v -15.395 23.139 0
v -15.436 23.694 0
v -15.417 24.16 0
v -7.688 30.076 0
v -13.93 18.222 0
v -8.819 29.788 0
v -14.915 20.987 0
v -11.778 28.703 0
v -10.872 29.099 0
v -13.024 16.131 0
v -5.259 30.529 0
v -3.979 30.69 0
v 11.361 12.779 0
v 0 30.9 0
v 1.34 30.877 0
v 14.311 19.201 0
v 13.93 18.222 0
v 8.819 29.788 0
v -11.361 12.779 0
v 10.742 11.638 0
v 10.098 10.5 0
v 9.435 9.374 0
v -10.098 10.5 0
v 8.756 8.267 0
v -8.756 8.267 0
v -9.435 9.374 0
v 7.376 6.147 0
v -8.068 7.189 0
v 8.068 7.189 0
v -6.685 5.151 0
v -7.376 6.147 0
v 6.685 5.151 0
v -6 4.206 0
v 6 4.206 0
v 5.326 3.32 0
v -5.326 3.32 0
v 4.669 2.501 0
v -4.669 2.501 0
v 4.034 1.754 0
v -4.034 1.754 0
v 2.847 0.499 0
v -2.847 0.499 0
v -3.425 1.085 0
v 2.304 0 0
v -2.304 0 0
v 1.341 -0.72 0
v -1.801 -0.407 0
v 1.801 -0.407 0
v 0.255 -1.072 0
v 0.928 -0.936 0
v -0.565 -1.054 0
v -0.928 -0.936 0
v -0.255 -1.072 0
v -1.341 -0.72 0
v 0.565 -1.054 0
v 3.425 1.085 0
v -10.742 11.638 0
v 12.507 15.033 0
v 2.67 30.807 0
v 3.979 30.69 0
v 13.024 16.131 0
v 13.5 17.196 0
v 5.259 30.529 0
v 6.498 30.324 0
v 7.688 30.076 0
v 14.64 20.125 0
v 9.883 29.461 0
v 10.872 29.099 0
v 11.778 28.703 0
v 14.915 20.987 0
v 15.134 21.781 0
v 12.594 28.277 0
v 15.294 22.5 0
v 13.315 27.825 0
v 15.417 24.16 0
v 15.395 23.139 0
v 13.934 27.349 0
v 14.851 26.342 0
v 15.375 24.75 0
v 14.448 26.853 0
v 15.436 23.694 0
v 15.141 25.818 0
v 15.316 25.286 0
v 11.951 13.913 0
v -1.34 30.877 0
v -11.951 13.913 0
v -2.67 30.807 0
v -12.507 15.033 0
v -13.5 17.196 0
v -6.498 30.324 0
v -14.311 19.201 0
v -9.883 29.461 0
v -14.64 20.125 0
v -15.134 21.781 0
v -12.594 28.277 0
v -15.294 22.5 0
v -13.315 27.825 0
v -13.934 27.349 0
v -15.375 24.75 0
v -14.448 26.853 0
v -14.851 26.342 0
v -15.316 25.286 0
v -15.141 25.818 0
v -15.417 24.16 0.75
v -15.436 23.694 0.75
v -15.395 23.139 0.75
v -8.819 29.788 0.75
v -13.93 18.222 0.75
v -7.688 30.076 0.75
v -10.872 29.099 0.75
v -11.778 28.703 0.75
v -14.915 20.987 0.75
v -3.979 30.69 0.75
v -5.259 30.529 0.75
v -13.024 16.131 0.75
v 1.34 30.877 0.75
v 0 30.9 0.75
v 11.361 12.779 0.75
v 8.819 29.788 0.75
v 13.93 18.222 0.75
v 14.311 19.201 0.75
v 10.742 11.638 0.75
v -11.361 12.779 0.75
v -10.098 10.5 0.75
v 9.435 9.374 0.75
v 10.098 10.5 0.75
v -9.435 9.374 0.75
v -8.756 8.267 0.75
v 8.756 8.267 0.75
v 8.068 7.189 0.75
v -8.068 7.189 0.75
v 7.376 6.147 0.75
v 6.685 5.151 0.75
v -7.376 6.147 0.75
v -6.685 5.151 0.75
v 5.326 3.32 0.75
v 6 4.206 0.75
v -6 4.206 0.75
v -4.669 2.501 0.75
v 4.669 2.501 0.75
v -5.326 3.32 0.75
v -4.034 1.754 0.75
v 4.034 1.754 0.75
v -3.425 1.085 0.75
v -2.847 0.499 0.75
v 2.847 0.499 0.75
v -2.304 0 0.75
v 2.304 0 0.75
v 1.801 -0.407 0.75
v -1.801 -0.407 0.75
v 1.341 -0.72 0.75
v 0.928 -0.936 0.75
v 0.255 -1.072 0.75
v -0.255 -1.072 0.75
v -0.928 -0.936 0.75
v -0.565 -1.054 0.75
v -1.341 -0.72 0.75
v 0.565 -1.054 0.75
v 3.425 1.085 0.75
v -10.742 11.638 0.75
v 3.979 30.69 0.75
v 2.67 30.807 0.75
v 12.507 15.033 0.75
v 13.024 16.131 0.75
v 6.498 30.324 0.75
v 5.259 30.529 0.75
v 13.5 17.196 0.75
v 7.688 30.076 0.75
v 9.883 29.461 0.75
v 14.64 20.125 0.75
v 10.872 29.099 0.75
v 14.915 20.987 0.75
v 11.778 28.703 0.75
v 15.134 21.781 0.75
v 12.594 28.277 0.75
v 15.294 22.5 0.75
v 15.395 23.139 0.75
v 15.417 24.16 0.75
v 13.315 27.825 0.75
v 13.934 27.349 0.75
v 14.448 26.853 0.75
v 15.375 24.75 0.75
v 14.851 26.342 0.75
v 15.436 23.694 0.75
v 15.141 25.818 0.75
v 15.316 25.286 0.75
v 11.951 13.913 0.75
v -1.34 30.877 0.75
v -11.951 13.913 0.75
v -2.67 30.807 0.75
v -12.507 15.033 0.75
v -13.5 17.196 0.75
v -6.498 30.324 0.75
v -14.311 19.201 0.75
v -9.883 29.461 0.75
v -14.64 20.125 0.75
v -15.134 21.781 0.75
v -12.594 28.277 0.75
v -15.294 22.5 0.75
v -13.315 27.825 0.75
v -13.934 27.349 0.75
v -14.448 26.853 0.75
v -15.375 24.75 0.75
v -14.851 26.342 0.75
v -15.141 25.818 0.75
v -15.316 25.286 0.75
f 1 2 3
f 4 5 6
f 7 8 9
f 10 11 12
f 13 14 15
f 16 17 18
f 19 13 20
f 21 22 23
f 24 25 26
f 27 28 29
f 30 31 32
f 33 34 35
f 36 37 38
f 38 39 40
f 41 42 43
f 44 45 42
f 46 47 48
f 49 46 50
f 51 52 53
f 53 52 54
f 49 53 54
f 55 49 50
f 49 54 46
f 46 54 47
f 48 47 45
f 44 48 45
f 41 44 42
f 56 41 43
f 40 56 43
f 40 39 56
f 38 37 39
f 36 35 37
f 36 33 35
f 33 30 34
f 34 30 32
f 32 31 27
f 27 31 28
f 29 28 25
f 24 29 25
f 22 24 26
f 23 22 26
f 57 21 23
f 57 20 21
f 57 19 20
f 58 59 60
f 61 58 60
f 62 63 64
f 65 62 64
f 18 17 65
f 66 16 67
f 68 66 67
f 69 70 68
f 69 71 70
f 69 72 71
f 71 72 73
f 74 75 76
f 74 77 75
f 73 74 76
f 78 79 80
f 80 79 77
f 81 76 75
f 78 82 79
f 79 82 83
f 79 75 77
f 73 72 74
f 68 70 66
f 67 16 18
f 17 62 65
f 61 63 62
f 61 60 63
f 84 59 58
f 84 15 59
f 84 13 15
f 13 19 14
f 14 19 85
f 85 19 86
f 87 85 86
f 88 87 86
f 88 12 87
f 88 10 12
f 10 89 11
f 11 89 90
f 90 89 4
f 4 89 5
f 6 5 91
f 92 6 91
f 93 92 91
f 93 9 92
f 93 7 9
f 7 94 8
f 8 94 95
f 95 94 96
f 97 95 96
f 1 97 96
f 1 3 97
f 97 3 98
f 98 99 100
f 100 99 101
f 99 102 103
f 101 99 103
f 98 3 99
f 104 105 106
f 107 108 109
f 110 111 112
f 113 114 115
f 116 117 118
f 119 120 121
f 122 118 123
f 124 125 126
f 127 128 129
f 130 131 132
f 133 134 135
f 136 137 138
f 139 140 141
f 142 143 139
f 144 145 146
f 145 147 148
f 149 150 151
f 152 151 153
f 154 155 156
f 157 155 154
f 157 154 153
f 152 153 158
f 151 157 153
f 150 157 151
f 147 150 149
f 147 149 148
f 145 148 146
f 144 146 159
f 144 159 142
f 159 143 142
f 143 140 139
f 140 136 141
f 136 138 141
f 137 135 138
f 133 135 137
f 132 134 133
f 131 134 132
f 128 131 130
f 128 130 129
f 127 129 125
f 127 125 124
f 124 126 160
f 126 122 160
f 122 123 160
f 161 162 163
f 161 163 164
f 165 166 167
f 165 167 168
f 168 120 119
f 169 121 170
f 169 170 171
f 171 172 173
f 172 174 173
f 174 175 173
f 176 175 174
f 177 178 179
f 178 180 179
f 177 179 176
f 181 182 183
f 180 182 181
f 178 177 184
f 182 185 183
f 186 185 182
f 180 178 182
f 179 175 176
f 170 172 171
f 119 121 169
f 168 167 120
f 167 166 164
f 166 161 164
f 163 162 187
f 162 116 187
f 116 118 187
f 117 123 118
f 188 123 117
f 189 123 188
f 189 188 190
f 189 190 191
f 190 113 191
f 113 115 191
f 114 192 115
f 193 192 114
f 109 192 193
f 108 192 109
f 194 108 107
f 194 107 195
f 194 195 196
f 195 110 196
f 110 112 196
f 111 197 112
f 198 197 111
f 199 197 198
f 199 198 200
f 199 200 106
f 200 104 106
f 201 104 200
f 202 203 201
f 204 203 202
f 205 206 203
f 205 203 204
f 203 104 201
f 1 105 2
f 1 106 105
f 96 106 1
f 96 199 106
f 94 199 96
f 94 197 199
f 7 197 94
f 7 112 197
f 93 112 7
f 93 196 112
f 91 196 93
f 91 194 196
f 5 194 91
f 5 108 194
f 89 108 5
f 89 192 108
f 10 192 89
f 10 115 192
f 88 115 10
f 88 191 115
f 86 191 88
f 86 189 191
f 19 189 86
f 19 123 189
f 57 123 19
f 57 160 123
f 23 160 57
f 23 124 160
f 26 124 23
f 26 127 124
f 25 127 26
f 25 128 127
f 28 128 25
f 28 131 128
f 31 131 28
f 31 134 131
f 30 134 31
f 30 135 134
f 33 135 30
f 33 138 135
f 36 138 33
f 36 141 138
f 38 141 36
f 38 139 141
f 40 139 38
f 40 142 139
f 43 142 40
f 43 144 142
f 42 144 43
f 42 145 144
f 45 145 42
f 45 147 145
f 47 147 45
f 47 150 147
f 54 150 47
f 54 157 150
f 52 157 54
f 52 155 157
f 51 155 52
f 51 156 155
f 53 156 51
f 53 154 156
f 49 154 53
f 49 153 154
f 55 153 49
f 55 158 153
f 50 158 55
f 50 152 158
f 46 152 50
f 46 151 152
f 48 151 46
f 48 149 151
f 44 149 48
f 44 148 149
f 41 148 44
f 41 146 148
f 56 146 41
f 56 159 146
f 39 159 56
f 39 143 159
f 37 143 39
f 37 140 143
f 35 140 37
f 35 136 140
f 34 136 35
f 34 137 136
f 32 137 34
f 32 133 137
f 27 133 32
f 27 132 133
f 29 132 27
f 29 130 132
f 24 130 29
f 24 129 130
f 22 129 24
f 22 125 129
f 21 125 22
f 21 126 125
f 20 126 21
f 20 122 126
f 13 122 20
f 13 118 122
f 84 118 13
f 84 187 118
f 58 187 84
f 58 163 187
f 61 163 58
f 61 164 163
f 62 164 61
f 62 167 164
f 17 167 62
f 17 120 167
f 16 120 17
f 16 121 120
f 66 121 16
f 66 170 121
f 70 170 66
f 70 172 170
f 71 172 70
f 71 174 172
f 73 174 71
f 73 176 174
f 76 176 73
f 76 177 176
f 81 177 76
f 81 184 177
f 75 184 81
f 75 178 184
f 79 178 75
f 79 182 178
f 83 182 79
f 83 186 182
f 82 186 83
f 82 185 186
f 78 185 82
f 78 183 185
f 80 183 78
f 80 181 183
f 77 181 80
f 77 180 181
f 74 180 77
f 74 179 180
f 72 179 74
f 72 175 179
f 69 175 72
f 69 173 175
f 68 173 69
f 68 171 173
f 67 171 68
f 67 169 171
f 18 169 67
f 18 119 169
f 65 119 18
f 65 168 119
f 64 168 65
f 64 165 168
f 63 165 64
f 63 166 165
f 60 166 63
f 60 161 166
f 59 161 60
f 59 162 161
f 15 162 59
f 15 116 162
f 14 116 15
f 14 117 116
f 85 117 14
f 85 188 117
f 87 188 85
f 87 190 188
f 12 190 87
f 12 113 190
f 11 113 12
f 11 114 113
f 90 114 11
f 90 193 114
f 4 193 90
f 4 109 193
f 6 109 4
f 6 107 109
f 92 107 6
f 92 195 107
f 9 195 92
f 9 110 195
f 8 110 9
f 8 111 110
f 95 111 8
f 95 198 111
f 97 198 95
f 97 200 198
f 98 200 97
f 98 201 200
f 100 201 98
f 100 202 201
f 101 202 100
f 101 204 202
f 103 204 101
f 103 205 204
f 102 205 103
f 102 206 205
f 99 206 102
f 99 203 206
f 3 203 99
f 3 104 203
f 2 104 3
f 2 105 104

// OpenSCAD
//@param Length(float) length of plectrum
length = 30;
//@param Thickness(float) thickness of plectrum
thickness = 0.75;

linear_extrude(thickness) scale( length/40 ){
    hull() {
        translate ([-10,16]) rotate(30) scale([0.2,1]) circle (r=20,  $fn=72);
        translate ([10,16]) rotate(-30) scale([0.2,1]) circle (r=20,  $fn=72);
        translate ([0,33]) rotate(90) scale([0.4,1]) circle (r=20.5,  $fn=72);
    }
}
